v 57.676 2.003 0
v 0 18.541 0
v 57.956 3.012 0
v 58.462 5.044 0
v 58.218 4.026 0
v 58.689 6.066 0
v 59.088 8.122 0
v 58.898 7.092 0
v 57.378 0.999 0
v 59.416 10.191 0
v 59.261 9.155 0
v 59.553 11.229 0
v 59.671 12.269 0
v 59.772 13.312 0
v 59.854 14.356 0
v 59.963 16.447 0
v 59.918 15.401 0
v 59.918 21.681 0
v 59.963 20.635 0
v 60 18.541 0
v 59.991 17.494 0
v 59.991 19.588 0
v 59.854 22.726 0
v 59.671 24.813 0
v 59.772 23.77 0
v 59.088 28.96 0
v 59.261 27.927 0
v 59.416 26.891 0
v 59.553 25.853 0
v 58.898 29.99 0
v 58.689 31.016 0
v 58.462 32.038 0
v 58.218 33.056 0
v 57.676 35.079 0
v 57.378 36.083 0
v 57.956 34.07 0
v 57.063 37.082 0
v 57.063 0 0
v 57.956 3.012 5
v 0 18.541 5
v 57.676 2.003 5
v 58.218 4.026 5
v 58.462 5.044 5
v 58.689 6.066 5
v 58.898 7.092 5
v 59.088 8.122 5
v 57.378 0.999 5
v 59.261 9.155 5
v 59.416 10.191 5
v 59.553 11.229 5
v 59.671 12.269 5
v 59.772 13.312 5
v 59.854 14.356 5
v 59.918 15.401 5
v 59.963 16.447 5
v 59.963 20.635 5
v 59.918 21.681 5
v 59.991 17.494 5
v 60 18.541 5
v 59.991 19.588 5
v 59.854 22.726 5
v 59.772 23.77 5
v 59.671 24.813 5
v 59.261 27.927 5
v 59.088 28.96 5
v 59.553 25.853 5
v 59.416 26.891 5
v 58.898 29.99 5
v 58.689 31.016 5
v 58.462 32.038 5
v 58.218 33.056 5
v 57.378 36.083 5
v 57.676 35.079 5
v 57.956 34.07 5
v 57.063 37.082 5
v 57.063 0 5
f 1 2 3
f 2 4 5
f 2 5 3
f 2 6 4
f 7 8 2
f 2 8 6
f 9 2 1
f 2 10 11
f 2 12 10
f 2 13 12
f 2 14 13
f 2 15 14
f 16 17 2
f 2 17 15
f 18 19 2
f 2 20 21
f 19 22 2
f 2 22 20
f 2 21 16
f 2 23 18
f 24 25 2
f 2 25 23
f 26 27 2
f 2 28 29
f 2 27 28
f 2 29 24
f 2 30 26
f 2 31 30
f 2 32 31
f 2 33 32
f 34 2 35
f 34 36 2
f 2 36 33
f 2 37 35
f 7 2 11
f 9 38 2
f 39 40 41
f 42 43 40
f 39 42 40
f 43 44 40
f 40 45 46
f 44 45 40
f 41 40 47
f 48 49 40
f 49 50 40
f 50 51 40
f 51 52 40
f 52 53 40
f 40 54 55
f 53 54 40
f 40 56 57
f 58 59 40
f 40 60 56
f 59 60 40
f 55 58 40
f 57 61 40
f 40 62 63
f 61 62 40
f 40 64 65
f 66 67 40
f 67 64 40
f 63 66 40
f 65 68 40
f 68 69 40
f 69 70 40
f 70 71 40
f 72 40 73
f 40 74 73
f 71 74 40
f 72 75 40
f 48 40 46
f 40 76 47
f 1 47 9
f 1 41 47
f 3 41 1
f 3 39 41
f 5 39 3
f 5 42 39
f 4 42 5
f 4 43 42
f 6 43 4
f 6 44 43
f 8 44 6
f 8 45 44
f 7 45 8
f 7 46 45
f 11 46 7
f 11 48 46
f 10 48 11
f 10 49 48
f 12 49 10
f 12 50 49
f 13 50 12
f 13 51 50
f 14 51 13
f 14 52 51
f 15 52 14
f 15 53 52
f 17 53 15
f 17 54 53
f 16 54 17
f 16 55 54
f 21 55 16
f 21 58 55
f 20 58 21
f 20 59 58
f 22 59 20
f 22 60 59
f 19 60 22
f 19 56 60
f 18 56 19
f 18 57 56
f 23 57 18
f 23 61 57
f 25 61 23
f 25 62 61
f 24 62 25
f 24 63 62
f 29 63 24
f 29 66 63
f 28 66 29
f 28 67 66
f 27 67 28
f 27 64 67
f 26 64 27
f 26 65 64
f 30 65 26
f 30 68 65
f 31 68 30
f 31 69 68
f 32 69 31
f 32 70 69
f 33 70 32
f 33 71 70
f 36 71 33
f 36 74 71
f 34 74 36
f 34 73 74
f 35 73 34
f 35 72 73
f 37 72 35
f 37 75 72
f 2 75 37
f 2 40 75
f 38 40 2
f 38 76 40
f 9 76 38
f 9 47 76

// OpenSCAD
$fn = 32;

// ----------------------------------------------------------------------
// Arc profile plate: sector, 38 points
// ----------------------------------------------------------------------

// --- parameters (mm) ---
sector_angle = 36;        // sector angle, degrees
sector_r = 60;            // outer radius
arc_step = 1;             // sampling step of the arc, degrees
plate_t = 5;              // plate thickness, Z

bbox_x = 2 * sector_r * sin(sector_angle / 2);  // chord of the sector
bbox_y = sector_r;  // depth of the sector (apex to arc)

profile = [[57.063, 0], [57.378, 0.999], [57.676, 2.003], [57.956, 3.012], [58.218, 4.026], [58.462, 5.044], [58.689, 6.066], [58.898, 7.092], [59.088, 8.122], [59.261, 9.155], [59.416, 10.191], [59.553, 11.229], [59.671, 12.269], [59.772, 13.312], [59.854, 14.356], [59.918, 15.401], [59.963, 16.447], [59.991, 17.494], [60, 18.541], [59.991, 19.588], [59.963, 20.635], [59.918, 21.681], [59.854, 22.726], [59.772, 23.77], [59.671, 24.813], [59.553, 25.853], [59.416, 26.891], [59.261, 27.927], [59.088, 28.96], [58.898, 29.99], [58.689, 31.016], [58.462, 32.038], [58.218, 33.056], [57.956, 34.07], [57.676, 35.079], [57.378, 36.083], [57.063, 37.082], [0, 18.541]];  // primary outline, 38 points, counter clockwise

// --- the one profile operation ---
linear_extrude(height = plate_t) polygon(points = profile);
